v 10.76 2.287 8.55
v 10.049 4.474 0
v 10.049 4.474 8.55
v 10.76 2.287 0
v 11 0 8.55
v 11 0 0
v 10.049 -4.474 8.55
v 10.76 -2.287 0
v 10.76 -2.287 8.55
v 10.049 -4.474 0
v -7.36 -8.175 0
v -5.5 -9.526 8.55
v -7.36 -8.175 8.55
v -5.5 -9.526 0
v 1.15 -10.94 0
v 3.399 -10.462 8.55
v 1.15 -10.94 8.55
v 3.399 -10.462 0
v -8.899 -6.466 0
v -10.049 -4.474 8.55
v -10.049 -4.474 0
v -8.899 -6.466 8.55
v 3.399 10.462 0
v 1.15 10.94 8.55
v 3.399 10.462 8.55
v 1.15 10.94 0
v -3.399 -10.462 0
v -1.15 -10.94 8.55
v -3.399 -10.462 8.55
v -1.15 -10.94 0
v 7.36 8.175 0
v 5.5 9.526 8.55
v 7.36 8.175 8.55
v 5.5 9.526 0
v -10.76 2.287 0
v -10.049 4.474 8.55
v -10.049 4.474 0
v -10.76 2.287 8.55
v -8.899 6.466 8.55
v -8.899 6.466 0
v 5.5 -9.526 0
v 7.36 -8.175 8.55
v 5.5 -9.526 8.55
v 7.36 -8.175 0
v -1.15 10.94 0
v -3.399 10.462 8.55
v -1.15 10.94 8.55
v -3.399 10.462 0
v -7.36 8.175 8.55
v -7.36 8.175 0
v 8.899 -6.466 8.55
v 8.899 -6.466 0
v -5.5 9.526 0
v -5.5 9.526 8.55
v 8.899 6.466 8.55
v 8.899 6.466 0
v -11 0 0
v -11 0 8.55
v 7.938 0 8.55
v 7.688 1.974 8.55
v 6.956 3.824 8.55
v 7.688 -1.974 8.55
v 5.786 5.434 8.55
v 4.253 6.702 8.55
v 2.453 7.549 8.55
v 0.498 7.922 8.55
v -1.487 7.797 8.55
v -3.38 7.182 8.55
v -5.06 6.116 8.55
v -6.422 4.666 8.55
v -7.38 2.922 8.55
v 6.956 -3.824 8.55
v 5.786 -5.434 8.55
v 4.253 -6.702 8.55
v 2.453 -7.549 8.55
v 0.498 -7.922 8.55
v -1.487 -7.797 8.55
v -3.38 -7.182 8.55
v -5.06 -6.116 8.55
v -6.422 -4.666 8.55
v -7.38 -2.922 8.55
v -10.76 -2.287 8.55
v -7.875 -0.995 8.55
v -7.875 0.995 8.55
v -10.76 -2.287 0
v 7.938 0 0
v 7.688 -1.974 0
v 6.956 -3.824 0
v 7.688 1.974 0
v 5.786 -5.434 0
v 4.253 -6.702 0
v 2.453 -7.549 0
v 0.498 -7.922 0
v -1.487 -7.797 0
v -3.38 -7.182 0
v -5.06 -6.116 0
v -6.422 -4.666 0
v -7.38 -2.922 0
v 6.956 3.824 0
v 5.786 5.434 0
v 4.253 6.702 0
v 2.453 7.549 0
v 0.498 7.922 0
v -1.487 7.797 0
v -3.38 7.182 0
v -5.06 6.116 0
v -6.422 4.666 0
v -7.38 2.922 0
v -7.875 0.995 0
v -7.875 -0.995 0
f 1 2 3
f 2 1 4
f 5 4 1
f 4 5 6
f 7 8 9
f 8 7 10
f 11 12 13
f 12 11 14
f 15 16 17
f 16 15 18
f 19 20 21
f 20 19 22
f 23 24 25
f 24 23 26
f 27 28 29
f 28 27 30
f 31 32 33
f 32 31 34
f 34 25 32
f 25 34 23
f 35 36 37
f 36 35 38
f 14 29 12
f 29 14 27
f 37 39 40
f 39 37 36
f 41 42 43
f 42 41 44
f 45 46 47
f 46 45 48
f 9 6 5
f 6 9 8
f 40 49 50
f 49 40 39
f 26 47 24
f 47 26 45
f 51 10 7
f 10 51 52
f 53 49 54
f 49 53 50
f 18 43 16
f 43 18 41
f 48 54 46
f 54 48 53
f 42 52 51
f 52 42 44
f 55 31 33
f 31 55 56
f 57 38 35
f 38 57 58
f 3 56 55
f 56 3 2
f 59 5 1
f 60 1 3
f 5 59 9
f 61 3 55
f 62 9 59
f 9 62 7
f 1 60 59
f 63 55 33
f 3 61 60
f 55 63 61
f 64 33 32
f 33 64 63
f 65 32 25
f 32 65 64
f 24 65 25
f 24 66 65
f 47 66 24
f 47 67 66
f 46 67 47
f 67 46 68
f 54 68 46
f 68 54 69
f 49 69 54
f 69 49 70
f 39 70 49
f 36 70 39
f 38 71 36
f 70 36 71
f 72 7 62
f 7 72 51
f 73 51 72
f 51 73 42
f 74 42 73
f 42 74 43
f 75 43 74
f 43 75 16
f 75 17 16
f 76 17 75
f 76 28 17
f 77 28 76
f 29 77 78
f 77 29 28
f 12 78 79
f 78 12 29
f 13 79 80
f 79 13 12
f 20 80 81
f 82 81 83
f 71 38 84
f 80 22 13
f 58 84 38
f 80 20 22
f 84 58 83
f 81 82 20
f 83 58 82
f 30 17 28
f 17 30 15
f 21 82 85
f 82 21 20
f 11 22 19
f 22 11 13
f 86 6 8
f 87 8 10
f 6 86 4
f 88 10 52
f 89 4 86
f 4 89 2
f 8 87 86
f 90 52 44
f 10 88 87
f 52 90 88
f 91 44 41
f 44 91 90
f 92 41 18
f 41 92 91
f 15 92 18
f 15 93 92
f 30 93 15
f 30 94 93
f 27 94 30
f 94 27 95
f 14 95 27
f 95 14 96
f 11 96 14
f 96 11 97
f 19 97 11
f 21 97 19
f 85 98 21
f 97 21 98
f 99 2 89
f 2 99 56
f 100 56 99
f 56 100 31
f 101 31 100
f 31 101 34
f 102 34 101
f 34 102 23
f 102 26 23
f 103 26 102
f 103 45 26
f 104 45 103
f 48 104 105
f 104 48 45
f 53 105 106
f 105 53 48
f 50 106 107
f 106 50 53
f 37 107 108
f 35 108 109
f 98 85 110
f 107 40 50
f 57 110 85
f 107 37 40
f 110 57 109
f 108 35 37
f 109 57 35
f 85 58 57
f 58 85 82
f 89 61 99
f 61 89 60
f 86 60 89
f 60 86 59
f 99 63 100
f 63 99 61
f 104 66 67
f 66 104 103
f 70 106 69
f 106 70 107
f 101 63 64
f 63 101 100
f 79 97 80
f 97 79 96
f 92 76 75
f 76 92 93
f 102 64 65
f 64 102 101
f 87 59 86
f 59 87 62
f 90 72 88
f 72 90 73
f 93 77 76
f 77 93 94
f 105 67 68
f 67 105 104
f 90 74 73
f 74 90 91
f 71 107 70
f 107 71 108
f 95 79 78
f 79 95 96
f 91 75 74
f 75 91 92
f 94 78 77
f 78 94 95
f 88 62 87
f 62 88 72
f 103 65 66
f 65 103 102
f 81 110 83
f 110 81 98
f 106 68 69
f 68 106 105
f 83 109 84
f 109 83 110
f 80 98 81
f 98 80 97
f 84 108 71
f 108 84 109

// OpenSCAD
hid=8.3;
bod=15.875;
sod=22;
ht=8.55;

difference() {
  cylinder(r=sod/2, h=ht);
  translate([0,0,-0.5])
    cylinder(r=bod/2, h=ht+1);
}
